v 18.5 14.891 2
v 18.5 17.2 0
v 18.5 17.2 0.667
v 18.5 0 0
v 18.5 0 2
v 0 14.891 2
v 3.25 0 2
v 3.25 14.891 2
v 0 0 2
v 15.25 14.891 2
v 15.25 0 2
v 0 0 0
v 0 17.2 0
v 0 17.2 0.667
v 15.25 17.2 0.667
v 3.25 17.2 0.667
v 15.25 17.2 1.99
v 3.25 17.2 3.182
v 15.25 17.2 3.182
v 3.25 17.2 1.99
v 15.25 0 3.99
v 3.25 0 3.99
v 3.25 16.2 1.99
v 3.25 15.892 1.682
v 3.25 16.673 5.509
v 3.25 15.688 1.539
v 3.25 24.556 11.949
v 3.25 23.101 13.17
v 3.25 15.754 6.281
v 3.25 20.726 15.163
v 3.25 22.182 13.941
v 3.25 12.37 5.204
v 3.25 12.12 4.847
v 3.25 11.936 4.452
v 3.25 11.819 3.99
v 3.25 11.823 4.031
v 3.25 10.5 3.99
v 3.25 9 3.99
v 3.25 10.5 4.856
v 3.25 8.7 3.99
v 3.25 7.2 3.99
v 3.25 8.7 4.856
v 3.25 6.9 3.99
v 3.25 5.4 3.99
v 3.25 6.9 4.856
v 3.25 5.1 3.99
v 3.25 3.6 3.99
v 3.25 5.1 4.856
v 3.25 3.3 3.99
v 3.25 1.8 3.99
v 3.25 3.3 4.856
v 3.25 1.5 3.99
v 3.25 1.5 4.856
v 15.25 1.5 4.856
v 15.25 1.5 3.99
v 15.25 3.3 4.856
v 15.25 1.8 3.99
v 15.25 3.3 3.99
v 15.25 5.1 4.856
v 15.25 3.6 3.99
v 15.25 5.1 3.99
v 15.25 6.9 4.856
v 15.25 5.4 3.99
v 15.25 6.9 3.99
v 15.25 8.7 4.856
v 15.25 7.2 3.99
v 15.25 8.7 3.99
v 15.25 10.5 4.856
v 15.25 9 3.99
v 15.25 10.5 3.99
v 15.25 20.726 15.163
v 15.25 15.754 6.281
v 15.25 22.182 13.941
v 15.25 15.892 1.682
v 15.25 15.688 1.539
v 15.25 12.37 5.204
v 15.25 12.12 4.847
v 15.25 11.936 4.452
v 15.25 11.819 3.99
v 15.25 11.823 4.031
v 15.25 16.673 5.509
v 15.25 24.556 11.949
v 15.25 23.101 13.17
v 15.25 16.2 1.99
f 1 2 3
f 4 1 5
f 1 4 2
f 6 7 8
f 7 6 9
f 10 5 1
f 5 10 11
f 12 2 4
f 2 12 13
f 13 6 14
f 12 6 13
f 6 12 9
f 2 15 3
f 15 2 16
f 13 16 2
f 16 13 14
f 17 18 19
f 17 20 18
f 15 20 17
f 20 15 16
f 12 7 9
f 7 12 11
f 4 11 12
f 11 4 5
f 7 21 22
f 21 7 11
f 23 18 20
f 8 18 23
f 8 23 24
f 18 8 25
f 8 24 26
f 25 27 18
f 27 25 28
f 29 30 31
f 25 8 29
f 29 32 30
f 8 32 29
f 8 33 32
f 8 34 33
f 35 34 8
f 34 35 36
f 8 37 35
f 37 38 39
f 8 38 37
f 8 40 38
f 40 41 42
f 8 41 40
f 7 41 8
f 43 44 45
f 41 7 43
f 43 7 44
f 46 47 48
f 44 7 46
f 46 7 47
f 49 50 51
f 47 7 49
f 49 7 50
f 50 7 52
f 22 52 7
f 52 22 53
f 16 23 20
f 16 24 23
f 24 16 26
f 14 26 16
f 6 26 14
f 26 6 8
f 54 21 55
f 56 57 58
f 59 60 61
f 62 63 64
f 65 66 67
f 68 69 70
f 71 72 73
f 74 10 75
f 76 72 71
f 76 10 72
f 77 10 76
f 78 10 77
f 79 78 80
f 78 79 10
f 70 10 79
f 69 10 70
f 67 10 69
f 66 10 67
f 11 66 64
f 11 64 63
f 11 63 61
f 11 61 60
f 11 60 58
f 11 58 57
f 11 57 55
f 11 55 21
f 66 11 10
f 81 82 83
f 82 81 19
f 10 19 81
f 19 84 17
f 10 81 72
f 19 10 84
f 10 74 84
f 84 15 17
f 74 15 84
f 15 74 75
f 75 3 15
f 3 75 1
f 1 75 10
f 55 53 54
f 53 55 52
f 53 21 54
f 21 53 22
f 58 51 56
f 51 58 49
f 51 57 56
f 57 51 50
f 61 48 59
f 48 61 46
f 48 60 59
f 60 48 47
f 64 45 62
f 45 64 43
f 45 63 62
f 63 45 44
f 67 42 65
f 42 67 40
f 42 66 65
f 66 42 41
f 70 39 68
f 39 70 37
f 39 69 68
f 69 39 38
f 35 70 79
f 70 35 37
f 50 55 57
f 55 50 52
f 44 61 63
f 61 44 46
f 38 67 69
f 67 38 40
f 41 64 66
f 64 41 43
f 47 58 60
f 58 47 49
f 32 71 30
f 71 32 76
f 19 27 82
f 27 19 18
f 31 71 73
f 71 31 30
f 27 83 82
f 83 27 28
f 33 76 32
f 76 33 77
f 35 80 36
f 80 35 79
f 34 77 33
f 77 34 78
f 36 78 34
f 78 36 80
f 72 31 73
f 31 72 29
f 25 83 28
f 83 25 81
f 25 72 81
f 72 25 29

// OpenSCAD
hs_w      = 18.5;
hs_l      = 17.2;
hs_h      = 2;
hs2_w     = 12;
hs2_l     = hs_l;
hs2_h     = 2;
hs2_x_off = (hs_w-hs2_w)/2;
hs3_l     = 13;
hs3_h     = 5;
hs3_w     = 1.2;

module hotshoe() {
    union() {
        difference() {
            cube([hs_w, hs_l, hs_h]);
            translate([-1,hs_l,hs_h/3]) rotate([60,0,0]) cube([hs2_x_off+1, 10,10]);
            translate([hs2_x_off+hs2_w,hs_l,hs_h/3]) rotate([60,0,0]) cube([hs2_x_off+1, 10,10]);
        }
        translate([hs2_x_off, 0, hs_h-0.01]) {
            cube([hs2_w, hs2_l, hs2_h]);
            for ( i = [0:5]) 
                translate([0,1+i*1.8,hs2_h]) rotate([0,90,0]) rotate([0,0,30]) cylinder(h=hs2_w, $fn=3);
        }
        translate([hs2_x_off, hs2_l-1, hs_h-0.01])
        rotate([50,0,0])
        difference() {
            union() {
                cube([hs2_w, hs3_l, hs3_h]);
                translate([0,0,hs3_h/2]) rotate([0,90,0]) cylinder(h=hs2_w, r=hs3_h/2, $fn=36);
            }
            translate([-1,3,(hs3_h-hs3_w)/2]) cube([hs2_w+2, hs3_l, hs3_w]);
        }
    }
}

hotshoe();

//rotate([90,0,90]) linear_extrude(height=hs_l) {
//    polygon(
//        points=[[0,0], [hs_w,0], [hs_w-hs_h, hs_h], [0, hs_h]],
//        paths=[[0,1,2,3]]
//    );
//}
